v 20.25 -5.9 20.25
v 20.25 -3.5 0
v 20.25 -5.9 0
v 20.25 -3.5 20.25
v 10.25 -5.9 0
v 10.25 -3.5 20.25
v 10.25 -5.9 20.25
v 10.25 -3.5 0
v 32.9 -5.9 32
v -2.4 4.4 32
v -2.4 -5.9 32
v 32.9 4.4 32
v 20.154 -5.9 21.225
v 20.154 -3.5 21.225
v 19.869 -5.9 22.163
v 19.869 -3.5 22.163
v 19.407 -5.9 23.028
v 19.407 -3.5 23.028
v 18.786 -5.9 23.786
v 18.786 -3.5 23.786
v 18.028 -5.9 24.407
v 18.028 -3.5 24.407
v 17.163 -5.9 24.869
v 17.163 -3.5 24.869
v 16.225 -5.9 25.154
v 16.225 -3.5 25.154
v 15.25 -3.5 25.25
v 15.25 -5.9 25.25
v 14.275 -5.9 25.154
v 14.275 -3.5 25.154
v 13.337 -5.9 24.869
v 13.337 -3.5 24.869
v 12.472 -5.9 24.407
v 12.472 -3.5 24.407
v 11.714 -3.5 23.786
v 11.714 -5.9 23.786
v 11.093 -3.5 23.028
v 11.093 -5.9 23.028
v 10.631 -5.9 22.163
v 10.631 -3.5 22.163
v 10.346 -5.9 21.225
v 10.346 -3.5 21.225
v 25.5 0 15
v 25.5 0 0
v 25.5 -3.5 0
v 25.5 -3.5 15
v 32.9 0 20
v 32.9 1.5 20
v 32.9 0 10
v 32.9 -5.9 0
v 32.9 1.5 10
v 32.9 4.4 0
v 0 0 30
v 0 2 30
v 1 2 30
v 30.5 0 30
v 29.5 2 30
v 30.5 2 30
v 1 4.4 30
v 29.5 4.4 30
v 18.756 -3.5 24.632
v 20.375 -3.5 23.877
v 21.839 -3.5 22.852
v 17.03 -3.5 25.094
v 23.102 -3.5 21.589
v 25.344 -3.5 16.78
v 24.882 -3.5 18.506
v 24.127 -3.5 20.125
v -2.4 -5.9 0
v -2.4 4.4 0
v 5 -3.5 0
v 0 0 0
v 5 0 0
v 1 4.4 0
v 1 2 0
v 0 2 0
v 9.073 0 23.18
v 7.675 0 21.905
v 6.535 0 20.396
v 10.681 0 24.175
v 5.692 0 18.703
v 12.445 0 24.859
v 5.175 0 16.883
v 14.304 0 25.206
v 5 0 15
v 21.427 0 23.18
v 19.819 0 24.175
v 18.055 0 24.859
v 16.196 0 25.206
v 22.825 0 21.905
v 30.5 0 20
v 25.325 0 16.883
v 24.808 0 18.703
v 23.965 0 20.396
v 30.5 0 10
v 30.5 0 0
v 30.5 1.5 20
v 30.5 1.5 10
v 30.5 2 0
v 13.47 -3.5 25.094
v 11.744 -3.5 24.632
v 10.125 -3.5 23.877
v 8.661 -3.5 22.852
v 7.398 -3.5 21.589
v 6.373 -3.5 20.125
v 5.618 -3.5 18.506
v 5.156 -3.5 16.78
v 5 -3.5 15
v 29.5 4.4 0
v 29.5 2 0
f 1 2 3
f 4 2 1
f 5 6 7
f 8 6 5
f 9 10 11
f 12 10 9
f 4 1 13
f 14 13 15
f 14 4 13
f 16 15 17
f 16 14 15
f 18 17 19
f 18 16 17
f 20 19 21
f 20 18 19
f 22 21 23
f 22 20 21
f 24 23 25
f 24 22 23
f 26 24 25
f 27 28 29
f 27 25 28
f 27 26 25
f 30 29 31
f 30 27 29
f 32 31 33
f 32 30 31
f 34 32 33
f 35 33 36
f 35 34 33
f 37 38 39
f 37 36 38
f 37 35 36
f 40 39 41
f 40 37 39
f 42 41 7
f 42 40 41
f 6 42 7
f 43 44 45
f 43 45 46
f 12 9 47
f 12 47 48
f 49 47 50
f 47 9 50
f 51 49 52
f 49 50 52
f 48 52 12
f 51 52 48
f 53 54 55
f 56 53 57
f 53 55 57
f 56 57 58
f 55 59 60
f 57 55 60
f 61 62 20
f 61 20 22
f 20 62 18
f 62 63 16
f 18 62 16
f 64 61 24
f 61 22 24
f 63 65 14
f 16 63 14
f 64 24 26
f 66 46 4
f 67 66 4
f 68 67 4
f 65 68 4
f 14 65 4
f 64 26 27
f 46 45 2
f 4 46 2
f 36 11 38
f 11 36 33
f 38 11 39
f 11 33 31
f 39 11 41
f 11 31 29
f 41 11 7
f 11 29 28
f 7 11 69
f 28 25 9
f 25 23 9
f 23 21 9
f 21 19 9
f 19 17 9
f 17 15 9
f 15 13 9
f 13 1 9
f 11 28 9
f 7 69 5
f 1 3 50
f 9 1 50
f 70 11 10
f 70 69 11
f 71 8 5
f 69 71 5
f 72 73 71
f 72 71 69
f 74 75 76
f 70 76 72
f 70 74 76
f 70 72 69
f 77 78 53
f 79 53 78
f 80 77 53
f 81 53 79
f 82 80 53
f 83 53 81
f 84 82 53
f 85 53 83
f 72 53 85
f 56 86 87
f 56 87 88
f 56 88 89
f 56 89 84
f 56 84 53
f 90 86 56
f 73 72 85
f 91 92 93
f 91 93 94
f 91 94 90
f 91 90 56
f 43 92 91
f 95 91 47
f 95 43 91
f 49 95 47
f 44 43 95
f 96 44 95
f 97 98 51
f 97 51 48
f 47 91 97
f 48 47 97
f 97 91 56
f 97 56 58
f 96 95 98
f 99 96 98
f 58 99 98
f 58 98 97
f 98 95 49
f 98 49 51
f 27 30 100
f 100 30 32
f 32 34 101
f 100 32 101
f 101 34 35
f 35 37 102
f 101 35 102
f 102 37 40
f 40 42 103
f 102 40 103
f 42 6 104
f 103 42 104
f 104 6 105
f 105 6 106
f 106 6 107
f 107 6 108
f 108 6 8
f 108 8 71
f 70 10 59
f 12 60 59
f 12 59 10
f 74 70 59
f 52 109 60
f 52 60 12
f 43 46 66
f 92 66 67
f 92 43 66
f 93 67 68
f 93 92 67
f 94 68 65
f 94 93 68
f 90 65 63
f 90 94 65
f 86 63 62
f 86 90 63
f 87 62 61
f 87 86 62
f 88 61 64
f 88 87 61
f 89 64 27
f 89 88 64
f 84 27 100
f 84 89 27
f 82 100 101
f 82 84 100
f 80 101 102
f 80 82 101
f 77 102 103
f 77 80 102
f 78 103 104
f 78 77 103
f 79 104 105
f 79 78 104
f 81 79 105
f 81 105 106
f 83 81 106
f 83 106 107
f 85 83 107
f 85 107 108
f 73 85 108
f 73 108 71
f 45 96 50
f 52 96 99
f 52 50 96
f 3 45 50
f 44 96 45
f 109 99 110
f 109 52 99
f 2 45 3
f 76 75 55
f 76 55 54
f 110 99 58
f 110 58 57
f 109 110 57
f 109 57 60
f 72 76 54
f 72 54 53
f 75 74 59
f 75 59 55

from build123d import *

# Parameters (mm, degrees)
SALIENTE_EXTRUIR1_DEPTH = 30
CORTAR_EXTRUIR1_DEPTH   = 3.5
CORTAR_EXTRUIR2_DEPTH   = 46.219685979
CROQUIS4_W              = 10
CROQUIS4_H              = 1.5
CORTAR_EXTRUIR3_DEPTH   = 3.5
CROQUIS5_W              = 35.3
CROQUIS5_H              = 10.3
SALIENTE_EXTRUIR2_DEPTH = 2


with BuildPart() as part:
    # Croquis1 → Saliente-Extruir1 (new body)
    with BuildSketch(Plane.XY):
        Polygon((0, 0), (30.5, 0), (30.5, 2), (29.5, 2), (29.5, 4.4), (32.9, 4.4), (32.9, -5.9), (-2.4, -5.9), (-2.4, 4.4), (1, 4.4), (1, 2), (0, 2), align=None)
    extrude(amount=SALIENTE_EXTRUIR1_DEPTH)

    # Croquis2 → Cortar-Extruir1 (cut)
    with BuildSketch(Plane(origin=(0, 0, 0), x_dir=(1, 0, 0), z_dir=(0, 1, 0))):
        with BuildLine():
            Line((5, -15), (5, 0))
            Line((5, 0), (25.5, 0))
            Line((25.5, 0), (25.5, -15))
            ThreePointArc((25.5, -15), (15.25, -25.25), (5, -15))
        make_face()
    extrude(amount=-CORTAR_EXTRUIR1_DEPTH, mode=Mode.SUBTRACT)

    # Croquis3 → Cortar-Extruir2 (cut, through all)
    with BuildSketch(Plane(origin=(0, -3.5, 0), x_dir=(1, 0, 0), z_dir=(0, 1, 0))):
        with BuildLine():
            Line((10.25, -20.25), (10.25, 0))
            Line((10.25, 0), (20.25, 0))
            Line((20.25, 0), (20.25, -20.25))
            ThreePointArc((20.25, -20.25), (15.25, -25.25), (10.25, -20.25))
        make_face()
    extrude(amount=-CORTAR_EXTRUIR2_DEPTH, mode=Mode.SUBTRACT)

    # Croquis4 → Cortar-Extruir3 (cut)
    with BuildSketch(Plane.ZY.offset(-30.5)):
        with Locations((15, 0.75)):
            Rectangle(CROQUIS4_W, CROQUIS4_H)
    extrude(amount=-CORTAR_EXTRUIR3_DEPTH, mode=Mode.SUBTRACT)

    # Croquis5 → Saliente-Extruir2 (add)
    with BuildSketch(Plane.XY.offset(30)):
        with Locations((15.25, -0.75)):
            Rectangle(CROQUIS5_W, CROQUIS5_H)
    extrude(amount=SALIENTE_EXTRUIR2_DEPTH)


solid = part.part
